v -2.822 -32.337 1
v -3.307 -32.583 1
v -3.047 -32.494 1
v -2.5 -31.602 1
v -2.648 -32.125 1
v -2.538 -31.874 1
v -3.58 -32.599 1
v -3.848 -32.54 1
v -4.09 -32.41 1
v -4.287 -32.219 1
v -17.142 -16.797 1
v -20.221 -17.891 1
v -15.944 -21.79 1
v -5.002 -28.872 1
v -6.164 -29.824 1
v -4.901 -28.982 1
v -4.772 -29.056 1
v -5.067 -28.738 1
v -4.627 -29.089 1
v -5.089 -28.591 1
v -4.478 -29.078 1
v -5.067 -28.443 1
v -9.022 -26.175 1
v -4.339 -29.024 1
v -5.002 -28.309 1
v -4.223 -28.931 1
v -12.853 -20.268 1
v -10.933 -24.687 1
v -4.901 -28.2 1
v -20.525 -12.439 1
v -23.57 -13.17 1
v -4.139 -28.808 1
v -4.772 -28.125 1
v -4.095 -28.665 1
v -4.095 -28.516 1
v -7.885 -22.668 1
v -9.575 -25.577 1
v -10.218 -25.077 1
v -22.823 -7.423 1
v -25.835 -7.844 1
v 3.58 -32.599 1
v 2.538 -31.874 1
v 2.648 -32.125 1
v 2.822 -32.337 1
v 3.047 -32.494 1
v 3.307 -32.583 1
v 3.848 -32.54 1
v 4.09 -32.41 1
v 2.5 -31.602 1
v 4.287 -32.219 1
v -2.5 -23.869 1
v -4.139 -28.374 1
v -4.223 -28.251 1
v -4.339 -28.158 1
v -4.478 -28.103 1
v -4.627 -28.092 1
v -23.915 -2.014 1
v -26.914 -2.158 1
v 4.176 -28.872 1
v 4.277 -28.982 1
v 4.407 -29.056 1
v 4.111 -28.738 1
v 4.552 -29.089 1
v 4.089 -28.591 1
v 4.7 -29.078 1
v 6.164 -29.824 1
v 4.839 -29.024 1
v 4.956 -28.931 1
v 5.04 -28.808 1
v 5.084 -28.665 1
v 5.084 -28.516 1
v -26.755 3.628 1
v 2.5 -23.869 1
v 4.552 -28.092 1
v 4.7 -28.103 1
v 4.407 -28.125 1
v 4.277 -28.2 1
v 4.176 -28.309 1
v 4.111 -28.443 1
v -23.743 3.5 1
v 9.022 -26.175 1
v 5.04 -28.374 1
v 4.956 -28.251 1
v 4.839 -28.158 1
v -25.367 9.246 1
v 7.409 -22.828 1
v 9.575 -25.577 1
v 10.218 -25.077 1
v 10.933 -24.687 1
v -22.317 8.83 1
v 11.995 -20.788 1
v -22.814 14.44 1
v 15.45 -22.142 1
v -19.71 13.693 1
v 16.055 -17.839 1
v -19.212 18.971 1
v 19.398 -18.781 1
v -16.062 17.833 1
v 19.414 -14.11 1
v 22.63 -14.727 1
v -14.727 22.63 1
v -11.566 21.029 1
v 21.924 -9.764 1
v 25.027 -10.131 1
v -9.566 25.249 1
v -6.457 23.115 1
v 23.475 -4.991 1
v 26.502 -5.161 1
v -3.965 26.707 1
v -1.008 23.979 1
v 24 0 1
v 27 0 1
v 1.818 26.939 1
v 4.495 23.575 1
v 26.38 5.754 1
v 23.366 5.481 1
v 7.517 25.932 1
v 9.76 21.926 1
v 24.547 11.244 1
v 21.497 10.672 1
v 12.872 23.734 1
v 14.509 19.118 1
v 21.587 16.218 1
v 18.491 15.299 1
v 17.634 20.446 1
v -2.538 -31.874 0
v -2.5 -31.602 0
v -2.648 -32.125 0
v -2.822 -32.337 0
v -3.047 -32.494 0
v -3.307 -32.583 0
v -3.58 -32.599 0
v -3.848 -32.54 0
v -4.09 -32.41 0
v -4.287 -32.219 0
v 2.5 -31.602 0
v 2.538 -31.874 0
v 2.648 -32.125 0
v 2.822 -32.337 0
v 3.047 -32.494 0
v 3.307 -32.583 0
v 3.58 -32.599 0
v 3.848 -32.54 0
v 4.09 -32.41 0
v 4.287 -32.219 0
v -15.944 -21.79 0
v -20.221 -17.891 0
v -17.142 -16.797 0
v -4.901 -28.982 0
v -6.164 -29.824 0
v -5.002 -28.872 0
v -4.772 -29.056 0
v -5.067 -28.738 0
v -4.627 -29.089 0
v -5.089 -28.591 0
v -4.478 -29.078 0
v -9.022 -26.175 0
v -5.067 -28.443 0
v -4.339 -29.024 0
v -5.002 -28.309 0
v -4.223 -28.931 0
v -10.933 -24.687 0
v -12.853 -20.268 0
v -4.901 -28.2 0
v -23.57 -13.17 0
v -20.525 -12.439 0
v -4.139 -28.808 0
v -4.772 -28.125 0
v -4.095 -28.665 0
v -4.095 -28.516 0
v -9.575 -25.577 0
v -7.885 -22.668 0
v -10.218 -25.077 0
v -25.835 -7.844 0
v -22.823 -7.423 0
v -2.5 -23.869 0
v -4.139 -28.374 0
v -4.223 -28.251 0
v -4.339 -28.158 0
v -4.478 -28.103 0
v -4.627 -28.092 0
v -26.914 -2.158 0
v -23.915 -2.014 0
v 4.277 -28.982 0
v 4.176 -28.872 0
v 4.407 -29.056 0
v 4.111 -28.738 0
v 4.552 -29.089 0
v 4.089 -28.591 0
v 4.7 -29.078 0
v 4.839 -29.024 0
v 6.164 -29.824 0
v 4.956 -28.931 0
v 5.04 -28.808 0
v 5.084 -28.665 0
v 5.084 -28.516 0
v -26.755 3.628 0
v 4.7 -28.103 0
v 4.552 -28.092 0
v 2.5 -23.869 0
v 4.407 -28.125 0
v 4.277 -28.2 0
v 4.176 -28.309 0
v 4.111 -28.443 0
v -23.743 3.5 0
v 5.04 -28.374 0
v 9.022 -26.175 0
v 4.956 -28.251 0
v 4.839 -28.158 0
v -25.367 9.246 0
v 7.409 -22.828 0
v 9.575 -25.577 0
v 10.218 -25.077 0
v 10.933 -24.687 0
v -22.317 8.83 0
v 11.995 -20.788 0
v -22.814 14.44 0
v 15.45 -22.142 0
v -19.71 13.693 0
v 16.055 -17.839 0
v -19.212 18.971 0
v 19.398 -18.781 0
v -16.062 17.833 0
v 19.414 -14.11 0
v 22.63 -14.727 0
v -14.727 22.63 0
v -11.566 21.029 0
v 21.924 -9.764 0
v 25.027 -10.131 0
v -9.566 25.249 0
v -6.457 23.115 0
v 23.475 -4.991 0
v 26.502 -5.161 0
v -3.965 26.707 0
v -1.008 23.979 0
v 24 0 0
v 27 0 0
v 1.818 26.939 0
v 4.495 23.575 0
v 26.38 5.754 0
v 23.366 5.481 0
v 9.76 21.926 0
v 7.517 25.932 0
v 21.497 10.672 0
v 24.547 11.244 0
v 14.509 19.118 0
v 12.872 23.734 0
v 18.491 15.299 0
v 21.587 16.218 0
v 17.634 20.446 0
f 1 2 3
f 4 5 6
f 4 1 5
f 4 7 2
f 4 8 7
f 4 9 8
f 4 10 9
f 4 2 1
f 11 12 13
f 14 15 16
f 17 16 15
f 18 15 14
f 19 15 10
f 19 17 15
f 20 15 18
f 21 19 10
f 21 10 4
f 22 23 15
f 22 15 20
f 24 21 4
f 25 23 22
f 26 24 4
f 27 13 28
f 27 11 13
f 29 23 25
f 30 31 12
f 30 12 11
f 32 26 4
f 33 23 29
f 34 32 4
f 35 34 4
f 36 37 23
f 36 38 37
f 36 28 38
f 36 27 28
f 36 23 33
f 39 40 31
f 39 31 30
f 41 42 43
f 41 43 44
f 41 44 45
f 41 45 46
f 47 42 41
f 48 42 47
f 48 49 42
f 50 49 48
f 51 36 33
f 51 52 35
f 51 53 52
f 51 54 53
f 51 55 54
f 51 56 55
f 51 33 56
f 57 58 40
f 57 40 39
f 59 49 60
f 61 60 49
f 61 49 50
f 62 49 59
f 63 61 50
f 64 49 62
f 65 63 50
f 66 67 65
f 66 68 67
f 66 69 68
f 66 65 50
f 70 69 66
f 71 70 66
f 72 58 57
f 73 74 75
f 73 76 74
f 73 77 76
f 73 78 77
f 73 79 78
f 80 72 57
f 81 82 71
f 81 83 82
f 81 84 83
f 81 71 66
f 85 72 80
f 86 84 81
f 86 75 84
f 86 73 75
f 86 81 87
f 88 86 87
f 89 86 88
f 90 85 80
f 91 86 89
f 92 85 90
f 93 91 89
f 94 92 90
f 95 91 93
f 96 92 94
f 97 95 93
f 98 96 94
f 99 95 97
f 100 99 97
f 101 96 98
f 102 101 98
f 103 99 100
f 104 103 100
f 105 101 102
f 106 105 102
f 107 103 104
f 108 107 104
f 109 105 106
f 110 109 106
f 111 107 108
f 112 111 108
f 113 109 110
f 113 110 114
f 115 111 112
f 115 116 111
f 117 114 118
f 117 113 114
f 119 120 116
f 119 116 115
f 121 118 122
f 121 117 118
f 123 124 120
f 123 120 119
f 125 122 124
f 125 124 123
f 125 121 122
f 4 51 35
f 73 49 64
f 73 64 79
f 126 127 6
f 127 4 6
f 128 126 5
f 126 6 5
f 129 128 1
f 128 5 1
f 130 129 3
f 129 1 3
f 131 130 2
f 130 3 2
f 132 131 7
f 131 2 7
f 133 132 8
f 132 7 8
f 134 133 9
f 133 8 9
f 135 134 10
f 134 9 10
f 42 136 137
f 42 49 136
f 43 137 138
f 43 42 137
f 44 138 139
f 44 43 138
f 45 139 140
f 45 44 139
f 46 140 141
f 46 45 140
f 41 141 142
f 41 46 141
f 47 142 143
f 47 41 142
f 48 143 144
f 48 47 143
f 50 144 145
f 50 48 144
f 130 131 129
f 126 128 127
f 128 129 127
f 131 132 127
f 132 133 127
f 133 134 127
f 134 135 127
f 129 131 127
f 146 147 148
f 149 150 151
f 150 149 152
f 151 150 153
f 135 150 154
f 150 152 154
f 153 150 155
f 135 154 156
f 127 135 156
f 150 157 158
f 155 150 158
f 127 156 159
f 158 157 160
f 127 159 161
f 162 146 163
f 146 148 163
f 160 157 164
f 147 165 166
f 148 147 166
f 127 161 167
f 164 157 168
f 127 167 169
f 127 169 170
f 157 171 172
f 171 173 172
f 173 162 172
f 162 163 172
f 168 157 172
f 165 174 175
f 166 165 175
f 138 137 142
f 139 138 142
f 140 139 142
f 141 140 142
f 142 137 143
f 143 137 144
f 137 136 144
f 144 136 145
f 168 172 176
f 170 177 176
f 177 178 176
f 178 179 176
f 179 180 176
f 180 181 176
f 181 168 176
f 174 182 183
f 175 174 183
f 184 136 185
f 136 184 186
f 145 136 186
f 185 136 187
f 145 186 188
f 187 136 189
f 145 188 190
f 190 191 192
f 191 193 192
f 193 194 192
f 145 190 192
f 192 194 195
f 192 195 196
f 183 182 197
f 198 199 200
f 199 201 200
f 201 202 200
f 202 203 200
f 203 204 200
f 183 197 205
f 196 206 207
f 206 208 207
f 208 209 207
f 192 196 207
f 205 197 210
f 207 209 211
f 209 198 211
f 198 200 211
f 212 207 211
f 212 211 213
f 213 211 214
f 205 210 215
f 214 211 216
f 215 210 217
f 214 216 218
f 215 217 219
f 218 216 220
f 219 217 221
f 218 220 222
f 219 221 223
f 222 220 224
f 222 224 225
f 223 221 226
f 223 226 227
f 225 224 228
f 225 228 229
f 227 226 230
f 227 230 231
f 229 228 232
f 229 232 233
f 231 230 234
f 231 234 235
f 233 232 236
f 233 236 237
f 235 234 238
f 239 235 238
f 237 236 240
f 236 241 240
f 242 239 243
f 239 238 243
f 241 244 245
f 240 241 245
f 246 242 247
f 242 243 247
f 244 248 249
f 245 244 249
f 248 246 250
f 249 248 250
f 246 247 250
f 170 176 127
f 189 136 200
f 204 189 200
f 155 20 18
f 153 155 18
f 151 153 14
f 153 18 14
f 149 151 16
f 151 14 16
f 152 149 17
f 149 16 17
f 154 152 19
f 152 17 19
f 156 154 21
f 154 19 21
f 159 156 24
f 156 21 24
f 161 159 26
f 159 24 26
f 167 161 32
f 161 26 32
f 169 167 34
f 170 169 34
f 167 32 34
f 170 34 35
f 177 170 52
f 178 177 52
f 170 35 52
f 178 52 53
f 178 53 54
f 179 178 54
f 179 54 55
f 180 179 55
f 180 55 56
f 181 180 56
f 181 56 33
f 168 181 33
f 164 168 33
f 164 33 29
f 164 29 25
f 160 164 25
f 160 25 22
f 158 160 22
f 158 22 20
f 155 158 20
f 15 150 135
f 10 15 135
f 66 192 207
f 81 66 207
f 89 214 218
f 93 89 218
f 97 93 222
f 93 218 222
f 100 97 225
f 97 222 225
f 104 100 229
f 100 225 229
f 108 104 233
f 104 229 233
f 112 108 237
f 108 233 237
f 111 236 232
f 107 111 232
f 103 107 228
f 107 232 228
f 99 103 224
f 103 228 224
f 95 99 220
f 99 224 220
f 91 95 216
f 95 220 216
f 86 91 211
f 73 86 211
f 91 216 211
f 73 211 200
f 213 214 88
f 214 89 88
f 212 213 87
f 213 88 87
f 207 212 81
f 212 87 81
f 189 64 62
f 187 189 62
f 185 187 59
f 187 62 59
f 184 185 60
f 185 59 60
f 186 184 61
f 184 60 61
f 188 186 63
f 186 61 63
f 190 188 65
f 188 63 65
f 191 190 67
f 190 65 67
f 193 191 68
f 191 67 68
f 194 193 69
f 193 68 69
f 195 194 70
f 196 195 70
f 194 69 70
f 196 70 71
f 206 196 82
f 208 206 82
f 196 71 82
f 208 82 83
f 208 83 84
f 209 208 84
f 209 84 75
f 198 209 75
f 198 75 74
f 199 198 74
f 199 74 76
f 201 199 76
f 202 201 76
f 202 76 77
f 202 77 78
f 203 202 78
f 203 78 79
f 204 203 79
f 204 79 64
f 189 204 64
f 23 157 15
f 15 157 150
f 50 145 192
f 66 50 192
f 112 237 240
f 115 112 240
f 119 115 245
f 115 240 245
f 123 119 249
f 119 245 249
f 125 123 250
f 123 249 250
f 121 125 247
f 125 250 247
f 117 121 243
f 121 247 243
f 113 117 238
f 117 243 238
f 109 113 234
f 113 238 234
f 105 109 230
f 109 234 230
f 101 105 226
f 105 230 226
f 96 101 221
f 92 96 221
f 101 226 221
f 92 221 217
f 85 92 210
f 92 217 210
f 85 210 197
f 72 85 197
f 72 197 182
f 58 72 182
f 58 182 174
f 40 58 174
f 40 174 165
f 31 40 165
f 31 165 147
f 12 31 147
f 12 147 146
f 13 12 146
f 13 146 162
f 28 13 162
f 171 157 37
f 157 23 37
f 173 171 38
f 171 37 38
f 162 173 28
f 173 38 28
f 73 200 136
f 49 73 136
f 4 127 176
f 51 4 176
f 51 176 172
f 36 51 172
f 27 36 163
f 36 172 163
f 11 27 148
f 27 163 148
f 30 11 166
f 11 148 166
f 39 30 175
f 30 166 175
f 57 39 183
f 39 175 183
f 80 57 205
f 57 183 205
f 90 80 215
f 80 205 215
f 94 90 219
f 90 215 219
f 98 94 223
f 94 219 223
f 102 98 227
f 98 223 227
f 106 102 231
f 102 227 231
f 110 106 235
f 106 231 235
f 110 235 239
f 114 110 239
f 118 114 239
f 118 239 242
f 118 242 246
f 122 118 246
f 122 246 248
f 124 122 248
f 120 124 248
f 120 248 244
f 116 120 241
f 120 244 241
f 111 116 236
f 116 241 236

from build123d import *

# Parameters (mm, degrees)
F1_DEPTH = 1
F2_R     = 1
F3_R     = 1
F4_D     = 1
F4_DEPTH = 2
F4_TIP   = 0.3004303095
F5_R     = 5
F6_R     = 5


with BuildPart() as f1:
    # F0 (on Top) → F1 (new body)
    with BuildSketch(Plane.XY):
        with BuildLine():
            Line((-2.5, -34.5), (-2.5, -26.8840101175))
            ThreePointArc((-2.5, -26.8840101175), (-6.224328148, -26.2727565951), (-9.8270364159, -25.1481481481))
            Line((-9.8270364159, -25.1481481481), (-6.1635182079, -29.8240740741))
            Line((-6.1635182079, -29.8240740741), (-2.5, -34.5))
        make_face()
        with BuildLine():
            ThreePointArc((9.8270364159, -25.1481481481), (6.224328148, -26.2727565951), (2.5, -26.8840101175))
            Line((2.5, -26.8840101175), (2.5, -34.5))
            Line((2.5, -34.5), (6.1635182079, -29.8240740741))
            Line((6.1635182079, -29.8240740741), (9.8270364159, -25.1481481481))
        make_face()
        with BuildLine():
            Line((-2.5, -26.8840101175), (-2.5, -26.5288885241))
            Line((-2.5, -26.5288885241), (-9.8270364159, -25.1481481481))
            ThreePointArc((-9.8270364159, -25.1481481481), (-6.224328148, -26.2727565951), (-2.5, -26.8840101175))
        make_face()
        with BuildLine():
            Line((9.8270364159, -25.1481481481), (2.5, -26.5288885241))
            Line((2.5, -26.5288885241), (2.5, -26.8840101175))
            ThreePointArc((2.5, -26.8840101175), (6.224328148, -26.2727565951), (9.8270364159, -25.1481481481))
        make_face()
        with BuildLine():
            ThreePointArc((-2.5, -23.8694365246), (-16.0623784042, 17.8325545001), (24, 0))
            ThreePointArc((24, 0), (17.8325545001, -16.0623784042), (2.5, -23.8694365246))
            Line((2.5, -23.8694365246), (2.5, -26.5288885241))
            Line((2.5, -26.5288885241), (9.8270364159, -25.1481481481))
            ThreePointArc((9.8270364159, -25.1481481481), (22.2971969452, -15.2261291334), (27, 0))
            ThreePointArc((27, 0), (-15.2261291334, 22.2971969452), (-9.8270364159, -25.1481481481))
            Line((-9.8270364159, -25.1481481481), (-2.5, -26.5288885241))
            Line((-2.5, -26.5288885241), (-2.5, -23.8694365246))
        make_face()
    extrude(amount=F1_DEPTH)

    # F2
    f2_edges = [f1.edges().sort_by_distance(p)[0] for p in [
        (2.5, -34.5, 0.5),
    ]]
    fillet(f2_edges, radius=F2_R)

    # F3
    f3_edges = [f1.edges().sort_by_distance(p)[0] for p in [
        (-2.5, -34.5, 0.5),
    ]]
    fillet(f3_edges, radius=F3_R)

    # F4
    with Locations(Plane(origin=(0, 0, 0), x_dir=(1, 0, 0), z_dir=(0, 0, -1))):
        with Locations((-4.5891780847, 28.5906020734), (4.5891780847, 28.5906020734)):
            Hole(F4_D / 2, depth=F4_DEPTH)
            with Locations((0, 0, -(F4_DEPTH + F4_TIP / 2))):  # 118° drill point
                Cone(0, F4_D / 2, F4_TIP, mode=Mode.SUBTRACT)

    # F5
    f5_edges = [f1.edges().sort_by_distance(p)[0] for p in [
        (-9.827036, -25.148148, 0.5),
    ]]
    fillet(f5_edges, radius=F5_R)

    # F6
    f6_edges = [f1.edges().sort_by_distance(p)[0] for p in [
        (9.827036, -25.148148, 0.5),
    ]]
    fillet(f6_edges, radius=F6_R)


solid = f1.part
